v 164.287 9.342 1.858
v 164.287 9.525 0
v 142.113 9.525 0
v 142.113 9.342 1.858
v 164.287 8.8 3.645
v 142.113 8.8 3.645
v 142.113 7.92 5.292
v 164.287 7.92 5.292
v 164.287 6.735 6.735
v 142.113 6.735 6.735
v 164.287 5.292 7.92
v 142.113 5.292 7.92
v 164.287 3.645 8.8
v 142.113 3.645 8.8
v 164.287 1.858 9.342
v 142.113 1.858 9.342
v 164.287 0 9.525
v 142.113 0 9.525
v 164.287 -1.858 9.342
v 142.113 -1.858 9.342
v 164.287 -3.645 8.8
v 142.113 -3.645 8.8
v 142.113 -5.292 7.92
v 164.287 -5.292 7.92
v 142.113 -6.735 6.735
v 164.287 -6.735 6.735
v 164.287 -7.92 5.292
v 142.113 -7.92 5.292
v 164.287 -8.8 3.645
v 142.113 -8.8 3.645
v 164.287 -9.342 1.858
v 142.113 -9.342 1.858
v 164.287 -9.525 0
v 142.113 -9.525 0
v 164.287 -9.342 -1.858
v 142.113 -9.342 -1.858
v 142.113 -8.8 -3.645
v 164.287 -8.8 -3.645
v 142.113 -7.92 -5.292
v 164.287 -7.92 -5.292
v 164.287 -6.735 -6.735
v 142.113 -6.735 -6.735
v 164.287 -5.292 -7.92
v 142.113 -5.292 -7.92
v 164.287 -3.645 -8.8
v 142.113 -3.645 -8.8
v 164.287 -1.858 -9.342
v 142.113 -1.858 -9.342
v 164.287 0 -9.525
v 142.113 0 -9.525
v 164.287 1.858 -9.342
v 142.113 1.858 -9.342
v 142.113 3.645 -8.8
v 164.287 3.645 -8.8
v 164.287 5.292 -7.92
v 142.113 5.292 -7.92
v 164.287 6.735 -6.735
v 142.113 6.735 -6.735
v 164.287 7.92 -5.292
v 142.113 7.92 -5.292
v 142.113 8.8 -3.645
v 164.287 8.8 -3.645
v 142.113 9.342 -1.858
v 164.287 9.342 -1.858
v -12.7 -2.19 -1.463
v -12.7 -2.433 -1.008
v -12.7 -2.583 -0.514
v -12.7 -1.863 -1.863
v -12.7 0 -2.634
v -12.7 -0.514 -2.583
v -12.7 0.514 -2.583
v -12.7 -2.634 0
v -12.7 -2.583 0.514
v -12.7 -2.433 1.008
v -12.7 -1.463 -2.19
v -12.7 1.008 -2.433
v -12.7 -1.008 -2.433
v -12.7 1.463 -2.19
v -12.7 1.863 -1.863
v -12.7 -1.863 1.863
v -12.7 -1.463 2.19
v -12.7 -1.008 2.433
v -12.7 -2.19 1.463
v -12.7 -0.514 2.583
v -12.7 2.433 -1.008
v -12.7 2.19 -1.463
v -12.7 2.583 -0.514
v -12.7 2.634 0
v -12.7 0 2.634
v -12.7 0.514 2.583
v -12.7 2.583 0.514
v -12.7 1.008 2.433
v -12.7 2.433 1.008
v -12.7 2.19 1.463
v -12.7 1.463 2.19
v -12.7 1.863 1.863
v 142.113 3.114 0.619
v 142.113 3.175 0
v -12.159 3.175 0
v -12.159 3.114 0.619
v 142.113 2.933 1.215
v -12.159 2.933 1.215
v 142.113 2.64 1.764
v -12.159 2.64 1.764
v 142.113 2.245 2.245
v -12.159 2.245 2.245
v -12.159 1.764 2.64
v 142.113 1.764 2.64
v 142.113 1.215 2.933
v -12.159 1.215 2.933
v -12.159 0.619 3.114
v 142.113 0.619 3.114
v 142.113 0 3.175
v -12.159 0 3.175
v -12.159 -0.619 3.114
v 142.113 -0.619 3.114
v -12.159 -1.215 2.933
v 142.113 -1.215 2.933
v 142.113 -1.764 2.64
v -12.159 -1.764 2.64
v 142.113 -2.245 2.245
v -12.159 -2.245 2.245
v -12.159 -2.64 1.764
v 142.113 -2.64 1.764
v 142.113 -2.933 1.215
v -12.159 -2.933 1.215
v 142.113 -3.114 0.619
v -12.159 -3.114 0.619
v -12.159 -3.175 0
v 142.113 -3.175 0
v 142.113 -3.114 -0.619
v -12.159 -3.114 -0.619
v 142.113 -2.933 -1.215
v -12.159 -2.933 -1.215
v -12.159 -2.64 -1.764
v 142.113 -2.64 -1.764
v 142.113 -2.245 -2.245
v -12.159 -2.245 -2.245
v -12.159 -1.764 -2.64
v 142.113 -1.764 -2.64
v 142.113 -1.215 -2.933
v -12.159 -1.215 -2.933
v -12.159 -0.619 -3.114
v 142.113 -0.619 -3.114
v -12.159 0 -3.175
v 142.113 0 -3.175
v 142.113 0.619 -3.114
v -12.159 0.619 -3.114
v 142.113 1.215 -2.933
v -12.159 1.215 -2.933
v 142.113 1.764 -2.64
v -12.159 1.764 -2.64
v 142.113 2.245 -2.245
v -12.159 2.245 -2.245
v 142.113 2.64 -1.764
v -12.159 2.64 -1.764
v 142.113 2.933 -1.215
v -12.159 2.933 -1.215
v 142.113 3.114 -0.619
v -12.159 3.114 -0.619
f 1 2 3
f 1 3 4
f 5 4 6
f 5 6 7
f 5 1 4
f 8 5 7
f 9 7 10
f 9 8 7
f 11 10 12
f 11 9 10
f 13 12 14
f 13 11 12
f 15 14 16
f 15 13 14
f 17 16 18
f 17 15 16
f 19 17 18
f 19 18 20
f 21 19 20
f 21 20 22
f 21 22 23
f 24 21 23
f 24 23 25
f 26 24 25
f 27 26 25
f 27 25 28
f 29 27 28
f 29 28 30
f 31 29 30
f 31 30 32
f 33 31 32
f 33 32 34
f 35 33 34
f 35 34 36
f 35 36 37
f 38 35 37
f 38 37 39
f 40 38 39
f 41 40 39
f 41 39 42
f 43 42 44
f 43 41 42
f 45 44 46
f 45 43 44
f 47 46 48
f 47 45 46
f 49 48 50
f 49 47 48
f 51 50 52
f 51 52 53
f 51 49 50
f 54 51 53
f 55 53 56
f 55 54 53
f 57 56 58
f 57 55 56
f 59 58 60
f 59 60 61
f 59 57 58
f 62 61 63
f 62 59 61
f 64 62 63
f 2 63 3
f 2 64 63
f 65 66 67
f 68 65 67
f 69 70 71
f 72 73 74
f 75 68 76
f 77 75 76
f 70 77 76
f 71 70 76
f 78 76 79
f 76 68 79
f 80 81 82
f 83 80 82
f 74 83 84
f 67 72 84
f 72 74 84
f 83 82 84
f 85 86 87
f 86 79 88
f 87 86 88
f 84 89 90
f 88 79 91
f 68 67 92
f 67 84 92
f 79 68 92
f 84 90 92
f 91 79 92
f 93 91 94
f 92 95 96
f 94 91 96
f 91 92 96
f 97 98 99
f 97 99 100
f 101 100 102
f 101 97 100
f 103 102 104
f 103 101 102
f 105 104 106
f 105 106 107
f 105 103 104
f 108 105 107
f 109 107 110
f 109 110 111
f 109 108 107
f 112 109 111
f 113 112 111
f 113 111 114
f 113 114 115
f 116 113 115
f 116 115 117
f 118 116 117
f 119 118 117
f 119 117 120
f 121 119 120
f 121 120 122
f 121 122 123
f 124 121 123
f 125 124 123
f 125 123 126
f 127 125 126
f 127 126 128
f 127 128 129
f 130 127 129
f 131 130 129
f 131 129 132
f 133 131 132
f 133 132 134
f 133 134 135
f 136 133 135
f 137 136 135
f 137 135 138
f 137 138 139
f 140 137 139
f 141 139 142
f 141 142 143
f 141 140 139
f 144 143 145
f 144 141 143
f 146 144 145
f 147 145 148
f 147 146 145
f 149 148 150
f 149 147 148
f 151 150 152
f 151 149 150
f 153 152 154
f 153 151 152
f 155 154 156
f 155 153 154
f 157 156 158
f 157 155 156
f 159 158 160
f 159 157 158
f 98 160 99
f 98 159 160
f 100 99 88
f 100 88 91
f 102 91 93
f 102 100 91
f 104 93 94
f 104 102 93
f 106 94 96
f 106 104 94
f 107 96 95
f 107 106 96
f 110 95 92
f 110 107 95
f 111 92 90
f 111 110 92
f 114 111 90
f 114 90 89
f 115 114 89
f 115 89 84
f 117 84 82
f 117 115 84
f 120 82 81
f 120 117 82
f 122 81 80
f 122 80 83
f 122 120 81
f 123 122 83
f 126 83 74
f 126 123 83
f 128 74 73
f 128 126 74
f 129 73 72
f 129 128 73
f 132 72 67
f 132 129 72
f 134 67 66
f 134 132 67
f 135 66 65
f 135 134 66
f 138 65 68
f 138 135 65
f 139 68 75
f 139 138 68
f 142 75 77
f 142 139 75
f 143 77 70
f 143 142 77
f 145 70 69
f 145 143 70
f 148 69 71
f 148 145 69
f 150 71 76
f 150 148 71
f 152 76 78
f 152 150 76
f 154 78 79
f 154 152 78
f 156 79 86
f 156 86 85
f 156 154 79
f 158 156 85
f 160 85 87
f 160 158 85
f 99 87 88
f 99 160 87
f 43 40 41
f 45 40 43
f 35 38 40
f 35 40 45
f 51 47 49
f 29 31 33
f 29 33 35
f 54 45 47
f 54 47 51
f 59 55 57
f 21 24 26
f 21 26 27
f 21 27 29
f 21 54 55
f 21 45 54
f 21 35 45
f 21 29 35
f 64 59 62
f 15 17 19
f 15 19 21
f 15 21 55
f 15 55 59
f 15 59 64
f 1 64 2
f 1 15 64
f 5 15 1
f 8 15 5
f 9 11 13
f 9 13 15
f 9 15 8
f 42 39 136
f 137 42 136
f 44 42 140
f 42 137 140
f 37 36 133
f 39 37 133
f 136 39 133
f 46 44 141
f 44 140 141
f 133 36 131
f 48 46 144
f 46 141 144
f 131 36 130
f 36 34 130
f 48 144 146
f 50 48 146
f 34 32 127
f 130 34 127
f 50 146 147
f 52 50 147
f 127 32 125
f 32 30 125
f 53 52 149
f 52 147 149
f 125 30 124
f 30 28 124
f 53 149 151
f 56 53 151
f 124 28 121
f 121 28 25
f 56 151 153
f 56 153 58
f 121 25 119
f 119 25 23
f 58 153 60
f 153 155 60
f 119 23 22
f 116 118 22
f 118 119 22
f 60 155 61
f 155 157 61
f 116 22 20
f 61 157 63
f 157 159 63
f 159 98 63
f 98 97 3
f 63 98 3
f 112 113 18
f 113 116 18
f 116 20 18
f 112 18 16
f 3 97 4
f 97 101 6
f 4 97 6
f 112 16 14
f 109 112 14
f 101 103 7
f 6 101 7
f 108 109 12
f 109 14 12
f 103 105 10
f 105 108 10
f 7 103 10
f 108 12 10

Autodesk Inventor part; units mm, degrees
sketch "Sketch_1" plane through (0, 0, 0) normal (0, 0, 1) x (1, 0, 0)
  line L0 (164.2872, 0) -> (0, 0)
  line L1 (0, 0) -> (0, 3.175)
  line L2 (0, 3.175) -> (164.2872, 3.175)
  line L3 (164.2872, 3.175) -> (164.2872, 0)
  line L4 (164.2872, 0) -> (0, 0)
revolve "Revolution1" add sketch "Sketch_1" angle 360 about axis through (164.2872, 0, 0) along (1, 0, 0)
sketch "Sketch_3" plane through (0, 0, 0) normal (0, 0, 1) x (1, 0, 0)
  line L0 (164.2872, 0) -> (142.113, 0)
  line L1 (142.113, 0) -> (142.113, 9.525)
  line L2 (142.113, 9.525) -> (164.2872, 9.525)
  line L3 (164.2872, 9.525) -> (164.2872, 0)
  line L4 (164.2872, 0) -> (142.113, 0)
revolve "Revolution2" add sketch "Sketch_3" angle 360 about axis through (164.2872, 0, 0) along (1, 0, 0)
sketch "Sketch_4" plane through (0, 0, 0) normal (0, 0, 1) x (1, 0, 0)
  line L0 (0, 0) -> (-12.7, 0)
  line L1 (-12.7, 0) -> (-12.7, 2.634)
  line L2 (-12.7, 2.634) -> (-12.159, 3.175)
  line L3 (-12.159, 3.175) -> (0, 3.175)
  line L4 (0, 3.175) -> (0, 0)
  line L5 (0, 0) -> (-12.7, 0)
revolve "Revolution3" add sketch "Sketch_4" angle 360 about axis through (0, 0, 0) along (1, 0, 0)
ref_plane "a_XY" through (-12.7, 0, 0) normal (1, 0, 0) x (0, 0, -1)
ref_plane "a_YZ" through (-12.7, 0, 0) normal (0, 0, -1) x (0, 1, 0)
ref_plane "a_ZX" through (-12.7, 0, 0) normal (0, 1, 0) x (1, 0, 0)
ref_plane "c1_XY" through (0, 0, 0) normal (1, 0, 0) x (0, 0, -1)
ref_plane "c1_YZ" through (0, 0, 0) normal (0, 0, -1) x (0, 1, 0)
ref_plane "c1_ZX" through (0, 0, 0) normal (0, 1, 0) x (1, 0, 0)
ref_plane "cc1_XY" through (0, 0, -3.175) normal (1, 0, 0) x (0, 0, -1)
ref_plane "cc1_YZ" through (0, 0, -3.175) normal (0, 0, -1) x (0, 1, 0)
ref_plane "cc1_ZX" through (0, 0, -3.175) normal (0, 1, 0) x (1, 0, 0)
ref_plane "cc2_XY" through (0, 0, 3.175) normal (1, 0, 0) x (0, 0, -1)
ref_plane "cc2_YZ" through (0, 0, 3.175) normal (0, 0, -1) x (0, 1, 0)
ref_plane "cc2_ZX" through (0, 0, 3.175) normal (0, 1, 0) x (1, 0, 0)
ref_plane "kk_XY" through (-6.35, 0, 3.175) normal (1, 0, 0) x (0, 0, -1)
ref_plane "kk_YZ" through (-6.35, 0, 3.175) normal (0, 0, -1) x (0, 1, 0)
ref_plane "kk_ZX" through (-6.35, 0, 3.175) normal (0, 1, 0) x (1, 0, 0)
ref_plane "rod_XY" through (164.2872, 0, 0) normal (1, 0, 0) x (0, 0, -1)
ref_plane "rod_YZ" through (164.2872, 0, 0) normal (0, 0, -1) x (0, 1, 0)
ref_plane "rod_ZX" through (164.2872, 0, 0) normal (0, 1, 0) x (1, 0, 0)
properties part number "6.4680.8730.50.500Double acting_00_006.4680.500.75N"
